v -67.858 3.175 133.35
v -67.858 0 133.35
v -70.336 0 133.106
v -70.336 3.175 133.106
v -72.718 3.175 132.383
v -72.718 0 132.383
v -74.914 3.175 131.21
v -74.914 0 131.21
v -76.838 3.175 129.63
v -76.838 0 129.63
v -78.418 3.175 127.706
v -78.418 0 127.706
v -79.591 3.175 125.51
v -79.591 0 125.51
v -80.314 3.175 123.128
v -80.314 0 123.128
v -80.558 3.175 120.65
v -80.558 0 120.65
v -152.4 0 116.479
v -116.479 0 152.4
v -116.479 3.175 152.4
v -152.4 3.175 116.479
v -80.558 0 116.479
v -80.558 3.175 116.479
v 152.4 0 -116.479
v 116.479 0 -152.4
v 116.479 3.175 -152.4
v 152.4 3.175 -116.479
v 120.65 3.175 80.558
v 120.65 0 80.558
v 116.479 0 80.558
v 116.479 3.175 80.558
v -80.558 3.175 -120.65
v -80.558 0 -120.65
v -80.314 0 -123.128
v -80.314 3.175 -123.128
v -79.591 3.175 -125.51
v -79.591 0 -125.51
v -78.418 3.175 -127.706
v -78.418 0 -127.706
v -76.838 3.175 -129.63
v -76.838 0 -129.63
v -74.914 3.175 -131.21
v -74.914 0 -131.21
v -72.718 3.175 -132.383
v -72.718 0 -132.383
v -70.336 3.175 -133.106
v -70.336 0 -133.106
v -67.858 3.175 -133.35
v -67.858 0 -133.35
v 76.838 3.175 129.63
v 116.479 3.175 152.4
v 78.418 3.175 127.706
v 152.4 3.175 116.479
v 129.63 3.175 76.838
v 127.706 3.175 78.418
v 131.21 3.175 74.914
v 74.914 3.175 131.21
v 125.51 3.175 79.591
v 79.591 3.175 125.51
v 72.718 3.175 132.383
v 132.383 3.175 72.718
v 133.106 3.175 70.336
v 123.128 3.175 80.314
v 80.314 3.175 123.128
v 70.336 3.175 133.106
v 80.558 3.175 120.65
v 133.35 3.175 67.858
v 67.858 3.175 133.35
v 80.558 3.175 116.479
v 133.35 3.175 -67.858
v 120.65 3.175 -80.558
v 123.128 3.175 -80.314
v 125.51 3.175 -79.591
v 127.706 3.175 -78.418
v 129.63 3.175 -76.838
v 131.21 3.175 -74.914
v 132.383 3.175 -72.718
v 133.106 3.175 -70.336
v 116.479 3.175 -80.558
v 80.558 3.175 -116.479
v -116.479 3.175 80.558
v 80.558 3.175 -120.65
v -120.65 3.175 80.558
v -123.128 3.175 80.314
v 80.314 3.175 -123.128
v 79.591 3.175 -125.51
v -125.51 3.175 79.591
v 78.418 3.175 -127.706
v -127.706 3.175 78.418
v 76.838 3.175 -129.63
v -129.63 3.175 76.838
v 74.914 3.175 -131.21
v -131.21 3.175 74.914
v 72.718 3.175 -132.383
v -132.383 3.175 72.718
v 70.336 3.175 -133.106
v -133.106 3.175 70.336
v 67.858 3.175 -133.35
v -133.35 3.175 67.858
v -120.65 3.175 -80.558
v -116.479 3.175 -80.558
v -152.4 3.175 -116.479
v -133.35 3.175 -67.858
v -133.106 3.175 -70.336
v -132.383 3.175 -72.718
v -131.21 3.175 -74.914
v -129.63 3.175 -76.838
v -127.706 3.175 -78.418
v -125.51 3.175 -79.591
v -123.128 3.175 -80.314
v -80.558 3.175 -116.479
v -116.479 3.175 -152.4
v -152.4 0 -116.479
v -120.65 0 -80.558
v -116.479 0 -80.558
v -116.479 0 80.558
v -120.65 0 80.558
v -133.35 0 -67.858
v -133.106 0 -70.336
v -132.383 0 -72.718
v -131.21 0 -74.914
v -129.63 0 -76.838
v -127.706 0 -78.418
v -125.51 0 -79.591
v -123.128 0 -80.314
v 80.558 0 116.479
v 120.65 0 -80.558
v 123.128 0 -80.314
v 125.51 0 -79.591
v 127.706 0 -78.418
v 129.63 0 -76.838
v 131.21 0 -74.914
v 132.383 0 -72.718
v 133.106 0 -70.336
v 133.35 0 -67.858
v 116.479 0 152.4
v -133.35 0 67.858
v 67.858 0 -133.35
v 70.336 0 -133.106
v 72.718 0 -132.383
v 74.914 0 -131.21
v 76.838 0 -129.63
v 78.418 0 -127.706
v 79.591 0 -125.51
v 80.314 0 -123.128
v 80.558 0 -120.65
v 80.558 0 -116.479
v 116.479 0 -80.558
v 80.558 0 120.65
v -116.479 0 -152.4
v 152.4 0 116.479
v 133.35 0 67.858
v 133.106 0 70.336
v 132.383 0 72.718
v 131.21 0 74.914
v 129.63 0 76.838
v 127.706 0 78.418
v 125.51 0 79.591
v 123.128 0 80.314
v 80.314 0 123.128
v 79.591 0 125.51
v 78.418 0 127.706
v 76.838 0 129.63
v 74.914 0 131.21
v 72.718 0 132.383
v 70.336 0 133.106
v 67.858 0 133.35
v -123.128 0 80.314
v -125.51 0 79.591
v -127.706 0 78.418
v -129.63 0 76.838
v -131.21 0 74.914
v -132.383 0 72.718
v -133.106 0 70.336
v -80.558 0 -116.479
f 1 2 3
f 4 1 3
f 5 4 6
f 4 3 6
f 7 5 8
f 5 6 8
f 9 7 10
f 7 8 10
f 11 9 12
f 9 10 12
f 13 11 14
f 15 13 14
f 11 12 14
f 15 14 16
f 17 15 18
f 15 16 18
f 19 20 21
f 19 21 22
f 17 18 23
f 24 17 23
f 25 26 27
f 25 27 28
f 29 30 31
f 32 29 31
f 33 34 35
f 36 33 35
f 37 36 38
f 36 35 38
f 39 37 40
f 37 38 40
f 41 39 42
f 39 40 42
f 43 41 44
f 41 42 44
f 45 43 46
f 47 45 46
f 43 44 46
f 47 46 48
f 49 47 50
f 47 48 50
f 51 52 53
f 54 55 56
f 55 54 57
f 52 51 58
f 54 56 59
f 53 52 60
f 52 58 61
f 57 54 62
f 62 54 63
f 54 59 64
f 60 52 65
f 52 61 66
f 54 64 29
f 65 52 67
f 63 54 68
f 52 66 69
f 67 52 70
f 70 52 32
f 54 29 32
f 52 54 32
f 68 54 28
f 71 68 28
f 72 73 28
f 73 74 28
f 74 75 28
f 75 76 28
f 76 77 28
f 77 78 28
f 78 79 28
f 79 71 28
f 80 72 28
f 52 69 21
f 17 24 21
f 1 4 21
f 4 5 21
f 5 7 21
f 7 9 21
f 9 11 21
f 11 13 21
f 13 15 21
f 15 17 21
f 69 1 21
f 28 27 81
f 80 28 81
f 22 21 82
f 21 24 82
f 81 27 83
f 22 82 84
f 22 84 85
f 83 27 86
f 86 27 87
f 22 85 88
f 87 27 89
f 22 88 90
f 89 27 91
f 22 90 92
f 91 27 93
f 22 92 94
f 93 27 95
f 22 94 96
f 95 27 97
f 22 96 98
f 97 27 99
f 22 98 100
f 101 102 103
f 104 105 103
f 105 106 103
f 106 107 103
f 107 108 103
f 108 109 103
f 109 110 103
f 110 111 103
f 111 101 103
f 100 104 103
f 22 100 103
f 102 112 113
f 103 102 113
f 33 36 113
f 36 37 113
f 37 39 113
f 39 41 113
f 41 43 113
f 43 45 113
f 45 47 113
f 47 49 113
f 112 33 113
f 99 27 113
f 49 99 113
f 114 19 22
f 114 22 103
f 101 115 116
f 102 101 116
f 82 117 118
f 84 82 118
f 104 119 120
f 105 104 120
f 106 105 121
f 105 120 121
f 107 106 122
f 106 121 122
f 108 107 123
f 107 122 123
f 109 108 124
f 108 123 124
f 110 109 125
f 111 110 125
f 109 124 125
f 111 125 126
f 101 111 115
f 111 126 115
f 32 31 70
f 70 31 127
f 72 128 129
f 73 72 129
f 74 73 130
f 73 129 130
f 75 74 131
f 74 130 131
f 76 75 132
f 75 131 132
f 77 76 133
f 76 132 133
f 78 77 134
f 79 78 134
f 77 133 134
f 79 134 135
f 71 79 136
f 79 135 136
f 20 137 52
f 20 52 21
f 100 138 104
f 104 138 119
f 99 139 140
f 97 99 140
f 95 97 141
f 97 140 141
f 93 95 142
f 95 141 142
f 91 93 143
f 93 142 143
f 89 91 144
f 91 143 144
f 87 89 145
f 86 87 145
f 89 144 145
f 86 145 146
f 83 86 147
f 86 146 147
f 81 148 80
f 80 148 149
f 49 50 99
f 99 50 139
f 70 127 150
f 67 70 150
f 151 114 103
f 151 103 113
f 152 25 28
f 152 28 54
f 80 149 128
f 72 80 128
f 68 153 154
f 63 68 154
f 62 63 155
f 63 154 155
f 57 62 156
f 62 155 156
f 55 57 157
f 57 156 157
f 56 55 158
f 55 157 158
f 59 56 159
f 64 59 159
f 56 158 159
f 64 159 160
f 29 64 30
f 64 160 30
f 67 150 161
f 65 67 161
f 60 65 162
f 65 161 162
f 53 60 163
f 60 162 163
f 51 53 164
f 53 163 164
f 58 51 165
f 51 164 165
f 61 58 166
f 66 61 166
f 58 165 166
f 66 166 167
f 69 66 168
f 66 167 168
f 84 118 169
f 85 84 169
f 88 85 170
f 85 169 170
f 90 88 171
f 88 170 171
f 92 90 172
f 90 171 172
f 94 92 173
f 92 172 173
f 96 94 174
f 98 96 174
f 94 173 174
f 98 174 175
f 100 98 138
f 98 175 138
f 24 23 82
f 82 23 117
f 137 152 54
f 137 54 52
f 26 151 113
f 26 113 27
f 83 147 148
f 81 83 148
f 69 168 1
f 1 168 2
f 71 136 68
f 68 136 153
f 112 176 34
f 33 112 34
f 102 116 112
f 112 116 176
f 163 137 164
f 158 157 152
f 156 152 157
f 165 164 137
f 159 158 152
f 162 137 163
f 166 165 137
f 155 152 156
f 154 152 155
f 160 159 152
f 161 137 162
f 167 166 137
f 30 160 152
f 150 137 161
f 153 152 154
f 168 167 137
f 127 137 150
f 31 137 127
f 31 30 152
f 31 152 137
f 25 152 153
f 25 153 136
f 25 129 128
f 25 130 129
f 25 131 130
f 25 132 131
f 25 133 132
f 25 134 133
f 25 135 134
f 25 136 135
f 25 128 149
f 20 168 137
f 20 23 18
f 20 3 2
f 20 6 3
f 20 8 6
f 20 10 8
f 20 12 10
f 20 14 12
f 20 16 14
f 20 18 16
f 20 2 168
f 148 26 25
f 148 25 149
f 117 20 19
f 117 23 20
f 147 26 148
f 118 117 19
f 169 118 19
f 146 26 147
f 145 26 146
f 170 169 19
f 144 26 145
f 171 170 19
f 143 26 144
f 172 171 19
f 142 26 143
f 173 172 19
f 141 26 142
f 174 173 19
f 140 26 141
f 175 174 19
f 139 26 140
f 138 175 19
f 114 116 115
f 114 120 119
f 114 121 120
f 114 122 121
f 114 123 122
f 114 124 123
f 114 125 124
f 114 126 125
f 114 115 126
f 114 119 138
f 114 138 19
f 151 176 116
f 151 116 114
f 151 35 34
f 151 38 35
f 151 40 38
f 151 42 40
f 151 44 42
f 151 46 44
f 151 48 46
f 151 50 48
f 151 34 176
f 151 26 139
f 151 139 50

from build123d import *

# Parameters (mm, degrees)
BOSS_EXTRUDE1_DEPTH = 3.175


with BuildPart() as part:
    # Sketch2 → Boss-Extrude1 (new body)
    with BuildSketch(Plane(origin=(0, 0, 0), x_dir=(1, 0, 0), z_dir=(0, 1, 0))):
        Polygon((-152.4, 116.478975516), (-116.478975516, 152.4), (116.478975516, 152.4), (152.4, 116.478975516), (152.4, -116.478975516), (116.478975516, -152.4), (-116.478975516, -152.4), (-152.4, -116.478975516), align=None)
        with BuildLine():
            Line((-116.478975516, 80.557951031), (-80.557951031, 116.478975516))
            Line((-80.557951031, 116.478975516), (-80.557951031, 120.65))
            ThreePointArc((-80.557951031, 120.65), (-76.838207153, 129.630256121), (-67.857951031, 133.35))
            Line((-67.857951031, 133.35), (67.857951031, 133.35))
            ThreePointArc((67.857951031, 133.35), (76.838207153, 129.630256121), (80.557951031, 120.65))
            Line((80.557951031, 120.65), (80.557951031, 116.478975516))
            Line((80.557951031, 116.478975516), (116.478975516, 80.557951031))
            Line((116.478975516, 80.557951031), (120.65, 80.557951031))
            ThreePointArc((120.65, 80.557951031), (129.630256121, 76.838207153), (133.35, 67.857951031))
            Line((133.35, 67.857951031), (133.35, -67.857951031))
            ThreePointArc((133.35, -67.857951031), (129.630256121, -76.838207153), (120.65, -80.557951031))
            Line((120.65, -80.557951031), (116.478975516, -80.557951031))
            Line((116.478975516, -80.557951031), (80.557951031, -116.478975516))
            Line((80.557951031, -116.478975516), (80.557951031, -120.65))
            ThreePointArc((80.557951031, -120.65), (76.838207153, -129.630256121), (67.857951031, -133.35))
            Line((67.857951031, -133.35), (-67.857951031, -133.35))
            ThreePointArc((-67.857951031, -133.35), (-76.838207153, -129.630256121), (-80.557951031, -120.65))
            Line((-80.557951031, -120.65), (-80.557951031, -116.478975516))
            Line((-80.557951031, -116.478975516), (-116.478975516, -80.557951031))
            Line((-116.478975516, -80.557951031), (-120.65, -80.557951031))
            ThreePointArc((-120.65, -80.557951031), (-129.630256121, -76.838207153), (-133.35, -67.857951031))
            Line((-133.35, -67.857951031), (-133.35, 67.857951031))
            ThreePointArc((-133.35, 67.857951031), (-129.630256121, 76.838207153), (-120.65, 80.557951031))
            Line((-120.65, 80.557951031), (-116.478975516, 80.557951031))
        make_face(mode=Mode.SUBTRACT)
    extrude(amount=BOSS_EXTRUDE1_DEPTH)


solid = part.part
